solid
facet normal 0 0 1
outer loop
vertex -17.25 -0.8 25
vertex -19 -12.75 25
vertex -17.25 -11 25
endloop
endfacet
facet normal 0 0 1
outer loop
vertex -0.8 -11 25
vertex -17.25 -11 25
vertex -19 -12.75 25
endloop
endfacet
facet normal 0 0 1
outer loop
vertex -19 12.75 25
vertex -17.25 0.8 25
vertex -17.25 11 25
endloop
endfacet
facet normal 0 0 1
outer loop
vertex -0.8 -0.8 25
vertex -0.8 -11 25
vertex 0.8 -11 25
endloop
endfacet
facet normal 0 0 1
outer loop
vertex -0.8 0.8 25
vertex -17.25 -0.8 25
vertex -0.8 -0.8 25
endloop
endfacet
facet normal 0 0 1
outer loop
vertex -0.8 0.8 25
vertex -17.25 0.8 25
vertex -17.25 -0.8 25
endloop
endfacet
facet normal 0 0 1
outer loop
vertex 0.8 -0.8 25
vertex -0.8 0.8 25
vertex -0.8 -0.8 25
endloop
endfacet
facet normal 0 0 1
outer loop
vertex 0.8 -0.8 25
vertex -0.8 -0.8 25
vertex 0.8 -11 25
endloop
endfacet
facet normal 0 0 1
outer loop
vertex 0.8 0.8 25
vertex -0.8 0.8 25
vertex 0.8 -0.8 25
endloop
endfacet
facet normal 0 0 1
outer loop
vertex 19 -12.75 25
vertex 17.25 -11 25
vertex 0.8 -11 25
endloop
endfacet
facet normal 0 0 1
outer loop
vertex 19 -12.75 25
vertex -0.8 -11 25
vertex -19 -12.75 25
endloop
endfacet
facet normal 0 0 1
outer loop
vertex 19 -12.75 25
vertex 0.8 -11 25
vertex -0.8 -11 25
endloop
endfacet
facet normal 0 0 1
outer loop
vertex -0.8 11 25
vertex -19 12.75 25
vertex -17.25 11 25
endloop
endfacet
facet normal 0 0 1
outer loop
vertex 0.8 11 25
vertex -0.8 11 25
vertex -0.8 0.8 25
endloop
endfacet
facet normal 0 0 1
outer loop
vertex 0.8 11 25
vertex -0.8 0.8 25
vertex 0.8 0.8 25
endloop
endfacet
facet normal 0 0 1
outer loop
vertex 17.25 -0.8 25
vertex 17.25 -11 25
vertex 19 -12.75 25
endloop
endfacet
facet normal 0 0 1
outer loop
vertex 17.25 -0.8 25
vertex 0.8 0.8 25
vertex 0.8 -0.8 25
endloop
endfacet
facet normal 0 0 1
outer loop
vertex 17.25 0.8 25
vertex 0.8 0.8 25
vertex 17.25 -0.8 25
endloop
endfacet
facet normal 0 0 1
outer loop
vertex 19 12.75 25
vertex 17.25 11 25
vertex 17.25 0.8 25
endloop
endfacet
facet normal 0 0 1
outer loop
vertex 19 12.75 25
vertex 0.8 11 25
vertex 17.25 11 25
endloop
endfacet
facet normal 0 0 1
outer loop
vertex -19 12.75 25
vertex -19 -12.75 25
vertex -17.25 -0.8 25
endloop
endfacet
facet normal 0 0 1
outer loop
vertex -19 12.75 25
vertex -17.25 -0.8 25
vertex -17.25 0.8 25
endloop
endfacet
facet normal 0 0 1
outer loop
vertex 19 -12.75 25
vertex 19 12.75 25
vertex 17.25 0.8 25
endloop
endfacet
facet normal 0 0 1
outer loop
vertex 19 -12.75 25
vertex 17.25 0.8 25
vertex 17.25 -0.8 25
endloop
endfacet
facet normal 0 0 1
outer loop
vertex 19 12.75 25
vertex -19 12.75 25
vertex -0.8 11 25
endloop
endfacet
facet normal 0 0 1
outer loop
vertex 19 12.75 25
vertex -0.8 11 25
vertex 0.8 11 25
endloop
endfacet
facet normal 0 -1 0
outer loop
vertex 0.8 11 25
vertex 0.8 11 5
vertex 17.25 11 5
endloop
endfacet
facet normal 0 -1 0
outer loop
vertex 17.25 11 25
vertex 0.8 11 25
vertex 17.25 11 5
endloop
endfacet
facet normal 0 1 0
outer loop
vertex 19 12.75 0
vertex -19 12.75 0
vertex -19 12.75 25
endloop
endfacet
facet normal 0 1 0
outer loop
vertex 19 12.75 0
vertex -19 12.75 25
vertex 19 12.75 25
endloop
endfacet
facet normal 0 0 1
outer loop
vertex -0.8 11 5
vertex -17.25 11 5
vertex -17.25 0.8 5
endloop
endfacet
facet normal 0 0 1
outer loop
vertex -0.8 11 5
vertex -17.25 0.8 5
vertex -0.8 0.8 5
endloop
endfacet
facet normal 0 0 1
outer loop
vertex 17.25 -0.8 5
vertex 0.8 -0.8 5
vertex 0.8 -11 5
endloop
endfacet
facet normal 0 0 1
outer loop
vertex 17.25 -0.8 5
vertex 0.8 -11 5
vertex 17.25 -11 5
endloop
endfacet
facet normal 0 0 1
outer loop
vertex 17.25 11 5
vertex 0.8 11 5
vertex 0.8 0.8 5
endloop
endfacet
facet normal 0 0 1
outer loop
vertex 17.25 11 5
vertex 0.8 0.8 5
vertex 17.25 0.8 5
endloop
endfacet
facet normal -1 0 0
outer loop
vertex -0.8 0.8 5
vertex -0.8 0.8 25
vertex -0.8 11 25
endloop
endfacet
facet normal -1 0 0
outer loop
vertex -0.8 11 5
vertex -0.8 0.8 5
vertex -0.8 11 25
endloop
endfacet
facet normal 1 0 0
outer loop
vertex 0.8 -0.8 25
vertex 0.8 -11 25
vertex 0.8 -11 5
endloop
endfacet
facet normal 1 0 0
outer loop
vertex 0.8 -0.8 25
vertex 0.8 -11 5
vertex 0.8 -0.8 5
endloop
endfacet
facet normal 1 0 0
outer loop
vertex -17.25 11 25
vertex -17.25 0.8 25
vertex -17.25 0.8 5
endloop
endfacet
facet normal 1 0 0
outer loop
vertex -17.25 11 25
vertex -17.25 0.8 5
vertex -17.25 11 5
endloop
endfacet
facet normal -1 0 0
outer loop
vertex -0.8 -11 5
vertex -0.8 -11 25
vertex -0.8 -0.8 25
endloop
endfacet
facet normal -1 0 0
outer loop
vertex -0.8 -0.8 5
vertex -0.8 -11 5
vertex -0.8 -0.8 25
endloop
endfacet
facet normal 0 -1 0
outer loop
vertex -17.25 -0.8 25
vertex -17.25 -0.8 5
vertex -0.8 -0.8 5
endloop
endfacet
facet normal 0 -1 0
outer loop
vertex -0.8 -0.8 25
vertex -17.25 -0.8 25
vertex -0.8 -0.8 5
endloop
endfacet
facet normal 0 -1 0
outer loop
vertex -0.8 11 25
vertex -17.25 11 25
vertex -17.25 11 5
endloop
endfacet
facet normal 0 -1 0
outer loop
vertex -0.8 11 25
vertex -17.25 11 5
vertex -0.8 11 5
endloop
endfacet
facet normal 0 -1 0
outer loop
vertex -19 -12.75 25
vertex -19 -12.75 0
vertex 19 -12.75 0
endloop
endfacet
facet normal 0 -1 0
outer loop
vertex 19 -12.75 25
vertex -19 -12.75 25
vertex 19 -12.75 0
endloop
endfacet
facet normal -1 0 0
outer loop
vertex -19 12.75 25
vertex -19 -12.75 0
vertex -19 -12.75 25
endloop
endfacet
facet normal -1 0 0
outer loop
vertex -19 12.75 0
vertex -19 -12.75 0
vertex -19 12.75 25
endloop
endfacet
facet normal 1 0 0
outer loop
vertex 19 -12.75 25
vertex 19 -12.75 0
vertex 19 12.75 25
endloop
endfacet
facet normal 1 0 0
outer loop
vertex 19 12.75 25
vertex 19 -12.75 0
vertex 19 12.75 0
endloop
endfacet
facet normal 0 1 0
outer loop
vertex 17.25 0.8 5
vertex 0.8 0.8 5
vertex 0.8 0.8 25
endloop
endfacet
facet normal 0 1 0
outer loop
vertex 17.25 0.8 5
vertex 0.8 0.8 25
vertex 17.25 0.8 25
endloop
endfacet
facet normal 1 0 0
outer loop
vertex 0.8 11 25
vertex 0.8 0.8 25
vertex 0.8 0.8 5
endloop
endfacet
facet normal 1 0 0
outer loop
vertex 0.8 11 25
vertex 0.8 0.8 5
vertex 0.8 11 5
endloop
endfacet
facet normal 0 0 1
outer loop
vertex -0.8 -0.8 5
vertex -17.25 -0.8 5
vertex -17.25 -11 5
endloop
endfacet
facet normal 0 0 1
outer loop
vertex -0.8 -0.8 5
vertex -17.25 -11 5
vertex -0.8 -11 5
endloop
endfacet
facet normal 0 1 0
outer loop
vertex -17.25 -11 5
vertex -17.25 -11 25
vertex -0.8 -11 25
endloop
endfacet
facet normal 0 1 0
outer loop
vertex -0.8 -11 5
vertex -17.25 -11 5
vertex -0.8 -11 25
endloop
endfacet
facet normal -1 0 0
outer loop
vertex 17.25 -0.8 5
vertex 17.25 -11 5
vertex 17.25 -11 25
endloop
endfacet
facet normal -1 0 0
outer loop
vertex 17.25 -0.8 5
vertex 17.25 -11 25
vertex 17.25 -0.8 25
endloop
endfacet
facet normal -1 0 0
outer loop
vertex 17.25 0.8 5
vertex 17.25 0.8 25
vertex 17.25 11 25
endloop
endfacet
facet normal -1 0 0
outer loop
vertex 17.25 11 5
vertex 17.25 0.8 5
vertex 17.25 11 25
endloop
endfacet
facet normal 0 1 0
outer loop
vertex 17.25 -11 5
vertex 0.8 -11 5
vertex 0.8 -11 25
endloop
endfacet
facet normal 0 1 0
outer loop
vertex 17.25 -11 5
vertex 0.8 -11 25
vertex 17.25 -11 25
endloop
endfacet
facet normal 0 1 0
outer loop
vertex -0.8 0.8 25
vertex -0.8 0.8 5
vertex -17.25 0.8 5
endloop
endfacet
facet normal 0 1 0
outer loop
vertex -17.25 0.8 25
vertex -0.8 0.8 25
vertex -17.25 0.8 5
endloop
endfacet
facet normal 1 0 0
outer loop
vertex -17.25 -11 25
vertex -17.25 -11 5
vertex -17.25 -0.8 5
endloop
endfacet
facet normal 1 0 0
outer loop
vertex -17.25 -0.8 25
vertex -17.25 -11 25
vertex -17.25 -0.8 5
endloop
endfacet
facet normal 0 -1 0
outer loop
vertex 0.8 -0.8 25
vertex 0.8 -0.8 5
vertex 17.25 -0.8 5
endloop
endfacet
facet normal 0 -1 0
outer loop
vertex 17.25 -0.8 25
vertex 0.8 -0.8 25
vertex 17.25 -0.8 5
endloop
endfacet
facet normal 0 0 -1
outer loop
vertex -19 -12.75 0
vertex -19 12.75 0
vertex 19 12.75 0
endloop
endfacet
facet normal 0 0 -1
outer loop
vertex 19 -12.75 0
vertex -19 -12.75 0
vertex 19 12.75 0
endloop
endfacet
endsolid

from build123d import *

# Parameters (mm, degrees)
F0_W     = 38
F0_H     = 25.5
F1_DEPTH = 25
F2_W     = 34.5
F2_H     = 22
F3_DEPTH = 20
F4_W     = 16.45
F4_H     = 1.6
F4_W_2   = 1.6
F4_H_2   = 10.2
F5_DEPTH = 20


with BuildPart() as f1:
    # F0 (on Top) → F1 (new body)
    with BuildSketch(Plane.XY):
        Rectangle(F0_W, F0_H)
    extrude(amount=F1_DEPTH)

    # F2 (on face) → F3 (cut)
    with BuildSketch(Plane.XY.offset(25)):
        Rectangle(F2_W, F2_H)
    extrude(amount=-F3_DEPTH, mode=Mode.SUBTRACT)

    # F4 (on face) → F5 (join)
    with BuildSketch(Plane.XY.offset(5)):
        with Locations((-9.025, 0)):
            Rectangle(F4_W, F4_H)
        with Locations((0, -5.9)):
            Rectangle(F4_W_2, F4_H_2)
        Rectangle(F4_W_2, F4_H)
        with Locations((0, 5.9)):
            Rectangle(F4_W_2, F4_H_2)
        with Locations((9.025, 0)):
            Rectangle(F4_W, F4_H)
    extrude(amount=F5_DEPTH)


solid = f1.part
